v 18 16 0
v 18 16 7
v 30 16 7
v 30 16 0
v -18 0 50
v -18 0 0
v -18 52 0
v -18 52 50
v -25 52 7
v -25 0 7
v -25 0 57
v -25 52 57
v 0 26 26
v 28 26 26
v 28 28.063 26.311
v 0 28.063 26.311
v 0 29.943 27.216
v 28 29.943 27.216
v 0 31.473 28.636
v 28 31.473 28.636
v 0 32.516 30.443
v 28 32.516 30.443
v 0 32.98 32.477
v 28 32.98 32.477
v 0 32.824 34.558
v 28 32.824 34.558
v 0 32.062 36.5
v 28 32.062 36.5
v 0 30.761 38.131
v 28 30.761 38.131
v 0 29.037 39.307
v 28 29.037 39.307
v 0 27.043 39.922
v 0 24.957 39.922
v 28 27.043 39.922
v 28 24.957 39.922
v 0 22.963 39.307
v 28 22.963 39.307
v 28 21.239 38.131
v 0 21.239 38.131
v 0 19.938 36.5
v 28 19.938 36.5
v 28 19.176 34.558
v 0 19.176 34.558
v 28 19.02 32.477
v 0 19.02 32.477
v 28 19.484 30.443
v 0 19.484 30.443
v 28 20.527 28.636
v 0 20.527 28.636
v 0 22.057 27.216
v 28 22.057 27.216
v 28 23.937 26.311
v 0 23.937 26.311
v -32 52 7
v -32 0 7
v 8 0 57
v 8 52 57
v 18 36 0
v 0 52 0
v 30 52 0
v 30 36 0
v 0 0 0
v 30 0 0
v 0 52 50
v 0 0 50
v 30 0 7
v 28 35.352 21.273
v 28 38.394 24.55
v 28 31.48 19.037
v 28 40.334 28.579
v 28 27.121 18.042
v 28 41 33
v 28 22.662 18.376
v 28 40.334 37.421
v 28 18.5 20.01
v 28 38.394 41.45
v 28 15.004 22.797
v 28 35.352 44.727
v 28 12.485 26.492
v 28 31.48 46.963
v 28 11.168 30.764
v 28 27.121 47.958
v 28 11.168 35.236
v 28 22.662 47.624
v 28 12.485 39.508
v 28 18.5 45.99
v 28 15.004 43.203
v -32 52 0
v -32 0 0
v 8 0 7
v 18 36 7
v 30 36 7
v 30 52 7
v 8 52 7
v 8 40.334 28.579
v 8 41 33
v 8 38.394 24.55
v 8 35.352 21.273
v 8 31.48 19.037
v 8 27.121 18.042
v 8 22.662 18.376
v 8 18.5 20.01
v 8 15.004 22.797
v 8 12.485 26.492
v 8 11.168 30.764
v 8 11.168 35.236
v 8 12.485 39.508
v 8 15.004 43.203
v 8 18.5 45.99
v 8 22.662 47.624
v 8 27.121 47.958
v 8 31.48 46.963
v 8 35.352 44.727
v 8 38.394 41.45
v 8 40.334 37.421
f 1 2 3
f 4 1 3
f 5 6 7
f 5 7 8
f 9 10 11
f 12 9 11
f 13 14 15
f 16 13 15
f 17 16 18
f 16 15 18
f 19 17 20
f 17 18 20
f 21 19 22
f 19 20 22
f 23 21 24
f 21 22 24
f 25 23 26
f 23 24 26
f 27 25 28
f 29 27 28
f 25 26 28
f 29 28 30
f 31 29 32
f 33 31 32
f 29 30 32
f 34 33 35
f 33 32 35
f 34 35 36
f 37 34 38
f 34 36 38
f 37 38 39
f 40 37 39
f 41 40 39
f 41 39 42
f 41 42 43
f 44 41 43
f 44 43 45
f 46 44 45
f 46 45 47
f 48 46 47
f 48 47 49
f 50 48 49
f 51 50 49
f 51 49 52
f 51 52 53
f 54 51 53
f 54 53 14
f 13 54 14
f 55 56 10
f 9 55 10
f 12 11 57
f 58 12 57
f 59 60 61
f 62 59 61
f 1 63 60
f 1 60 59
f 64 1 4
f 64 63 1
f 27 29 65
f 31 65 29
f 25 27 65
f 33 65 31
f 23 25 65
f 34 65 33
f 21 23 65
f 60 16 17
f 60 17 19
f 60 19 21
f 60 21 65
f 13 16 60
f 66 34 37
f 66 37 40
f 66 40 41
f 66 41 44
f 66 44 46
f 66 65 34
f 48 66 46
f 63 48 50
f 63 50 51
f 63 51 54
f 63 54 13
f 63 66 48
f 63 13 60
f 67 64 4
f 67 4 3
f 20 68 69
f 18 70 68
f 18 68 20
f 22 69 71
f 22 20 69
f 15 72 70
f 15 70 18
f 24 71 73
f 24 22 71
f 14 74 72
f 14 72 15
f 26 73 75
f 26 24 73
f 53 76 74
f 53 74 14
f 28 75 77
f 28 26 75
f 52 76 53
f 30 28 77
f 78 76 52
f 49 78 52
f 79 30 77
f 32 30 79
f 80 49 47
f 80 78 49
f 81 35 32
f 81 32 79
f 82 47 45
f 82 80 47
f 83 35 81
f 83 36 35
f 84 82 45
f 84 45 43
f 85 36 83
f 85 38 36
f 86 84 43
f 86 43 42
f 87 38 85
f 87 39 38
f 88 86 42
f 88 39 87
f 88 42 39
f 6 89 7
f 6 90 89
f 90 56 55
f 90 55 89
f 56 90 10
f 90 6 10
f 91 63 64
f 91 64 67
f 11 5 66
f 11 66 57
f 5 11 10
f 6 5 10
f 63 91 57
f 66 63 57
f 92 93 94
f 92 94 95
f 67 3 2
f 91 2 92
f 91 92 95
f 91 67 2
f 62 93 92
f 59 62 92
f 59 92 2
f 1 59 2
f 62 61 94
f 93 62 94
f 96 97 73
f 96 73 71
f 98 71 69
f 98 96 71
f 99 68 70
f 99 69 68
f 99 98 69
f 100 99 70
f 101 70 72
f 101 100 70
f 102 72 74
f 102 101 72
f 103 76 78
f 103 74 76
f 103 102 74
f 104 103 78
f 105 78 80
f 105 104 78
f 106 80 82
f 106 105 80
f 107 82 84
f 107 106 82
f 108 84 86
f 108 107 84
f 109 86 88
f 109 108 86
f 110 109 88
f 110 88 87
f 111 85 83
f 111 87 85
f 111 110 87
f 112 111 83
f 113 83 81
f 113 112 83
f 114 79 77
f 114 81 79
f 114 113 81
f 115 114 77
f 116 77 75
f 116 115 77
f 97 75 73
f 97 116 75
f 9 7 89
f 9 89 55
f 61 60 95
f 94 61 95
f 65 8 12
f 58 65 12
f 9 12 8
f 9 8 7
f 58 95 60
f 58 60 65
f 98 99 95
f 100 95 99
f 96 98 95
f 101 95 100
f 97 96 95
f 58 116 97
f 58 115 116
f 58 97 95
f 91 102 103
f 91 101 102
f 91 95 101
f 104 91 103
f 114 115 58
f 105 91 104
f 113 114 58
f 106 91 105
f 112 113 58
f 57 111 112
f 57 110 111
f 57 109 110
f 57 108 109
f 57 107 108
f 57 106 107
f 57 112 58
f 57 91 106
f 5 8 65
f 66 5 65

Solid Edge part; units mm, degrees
sketch "Sketch1" plane through (0, 0, 0) normal (0, -1, 0) x (1, 0, 0)
  line L0 (-25, 7) -> (-25, 57)
  line L1 (-25, 57) -> (8, 57)
  line L2 (8, 7) -> (8, 57)
  line L3 (30, 7) -> (8, 7)
  line L4 (30, 0) -> (30, 7)
  line L5 (0, 0) -> (30, 0)
  line L6 (0, 50) -> (0, 0)
  line L7 (-18, 50) -> (0, 50)
  line L8 (-18, 0) -> (-18, 50)
  line L9 (-32, 0) -> (-18, 0)
  line L10 (-32, 7) -> (-32, 0)
  line L11 (-32, 7) -> (-25, 7)
extrude "ProtrusiónExtruida_1" add sketch "Sketch1" against normal blind 52
sketch "Sketch2" plane through (19, 26, 7) normal (0, 0, 1) x (0, 1, 0)
  line L0 (-10, -11) -> (10, -11)
  line L1 (10, -11) -> (10, 1)
  line L2 (10, 1) -> (-10, 1)
  line L3 (-10, 1) -> (-10, -11)
extrude "VaciadoExtruido_1" cut sketch "Sketch2" against normal blind 7
sketch "Sketch3" plane through (8, 26, 32) normal (1, 0, 0) x (0, 1, 0)
  circle A0 centre (0, 1) radius 15
extrude "ProtrusiónExtruida_2" add sketch "Sketch3" along normal blind 20
hole "Agujero_1" at (28, 26, 33) direction (-1, 0, 0) diameter 14 end up to next
